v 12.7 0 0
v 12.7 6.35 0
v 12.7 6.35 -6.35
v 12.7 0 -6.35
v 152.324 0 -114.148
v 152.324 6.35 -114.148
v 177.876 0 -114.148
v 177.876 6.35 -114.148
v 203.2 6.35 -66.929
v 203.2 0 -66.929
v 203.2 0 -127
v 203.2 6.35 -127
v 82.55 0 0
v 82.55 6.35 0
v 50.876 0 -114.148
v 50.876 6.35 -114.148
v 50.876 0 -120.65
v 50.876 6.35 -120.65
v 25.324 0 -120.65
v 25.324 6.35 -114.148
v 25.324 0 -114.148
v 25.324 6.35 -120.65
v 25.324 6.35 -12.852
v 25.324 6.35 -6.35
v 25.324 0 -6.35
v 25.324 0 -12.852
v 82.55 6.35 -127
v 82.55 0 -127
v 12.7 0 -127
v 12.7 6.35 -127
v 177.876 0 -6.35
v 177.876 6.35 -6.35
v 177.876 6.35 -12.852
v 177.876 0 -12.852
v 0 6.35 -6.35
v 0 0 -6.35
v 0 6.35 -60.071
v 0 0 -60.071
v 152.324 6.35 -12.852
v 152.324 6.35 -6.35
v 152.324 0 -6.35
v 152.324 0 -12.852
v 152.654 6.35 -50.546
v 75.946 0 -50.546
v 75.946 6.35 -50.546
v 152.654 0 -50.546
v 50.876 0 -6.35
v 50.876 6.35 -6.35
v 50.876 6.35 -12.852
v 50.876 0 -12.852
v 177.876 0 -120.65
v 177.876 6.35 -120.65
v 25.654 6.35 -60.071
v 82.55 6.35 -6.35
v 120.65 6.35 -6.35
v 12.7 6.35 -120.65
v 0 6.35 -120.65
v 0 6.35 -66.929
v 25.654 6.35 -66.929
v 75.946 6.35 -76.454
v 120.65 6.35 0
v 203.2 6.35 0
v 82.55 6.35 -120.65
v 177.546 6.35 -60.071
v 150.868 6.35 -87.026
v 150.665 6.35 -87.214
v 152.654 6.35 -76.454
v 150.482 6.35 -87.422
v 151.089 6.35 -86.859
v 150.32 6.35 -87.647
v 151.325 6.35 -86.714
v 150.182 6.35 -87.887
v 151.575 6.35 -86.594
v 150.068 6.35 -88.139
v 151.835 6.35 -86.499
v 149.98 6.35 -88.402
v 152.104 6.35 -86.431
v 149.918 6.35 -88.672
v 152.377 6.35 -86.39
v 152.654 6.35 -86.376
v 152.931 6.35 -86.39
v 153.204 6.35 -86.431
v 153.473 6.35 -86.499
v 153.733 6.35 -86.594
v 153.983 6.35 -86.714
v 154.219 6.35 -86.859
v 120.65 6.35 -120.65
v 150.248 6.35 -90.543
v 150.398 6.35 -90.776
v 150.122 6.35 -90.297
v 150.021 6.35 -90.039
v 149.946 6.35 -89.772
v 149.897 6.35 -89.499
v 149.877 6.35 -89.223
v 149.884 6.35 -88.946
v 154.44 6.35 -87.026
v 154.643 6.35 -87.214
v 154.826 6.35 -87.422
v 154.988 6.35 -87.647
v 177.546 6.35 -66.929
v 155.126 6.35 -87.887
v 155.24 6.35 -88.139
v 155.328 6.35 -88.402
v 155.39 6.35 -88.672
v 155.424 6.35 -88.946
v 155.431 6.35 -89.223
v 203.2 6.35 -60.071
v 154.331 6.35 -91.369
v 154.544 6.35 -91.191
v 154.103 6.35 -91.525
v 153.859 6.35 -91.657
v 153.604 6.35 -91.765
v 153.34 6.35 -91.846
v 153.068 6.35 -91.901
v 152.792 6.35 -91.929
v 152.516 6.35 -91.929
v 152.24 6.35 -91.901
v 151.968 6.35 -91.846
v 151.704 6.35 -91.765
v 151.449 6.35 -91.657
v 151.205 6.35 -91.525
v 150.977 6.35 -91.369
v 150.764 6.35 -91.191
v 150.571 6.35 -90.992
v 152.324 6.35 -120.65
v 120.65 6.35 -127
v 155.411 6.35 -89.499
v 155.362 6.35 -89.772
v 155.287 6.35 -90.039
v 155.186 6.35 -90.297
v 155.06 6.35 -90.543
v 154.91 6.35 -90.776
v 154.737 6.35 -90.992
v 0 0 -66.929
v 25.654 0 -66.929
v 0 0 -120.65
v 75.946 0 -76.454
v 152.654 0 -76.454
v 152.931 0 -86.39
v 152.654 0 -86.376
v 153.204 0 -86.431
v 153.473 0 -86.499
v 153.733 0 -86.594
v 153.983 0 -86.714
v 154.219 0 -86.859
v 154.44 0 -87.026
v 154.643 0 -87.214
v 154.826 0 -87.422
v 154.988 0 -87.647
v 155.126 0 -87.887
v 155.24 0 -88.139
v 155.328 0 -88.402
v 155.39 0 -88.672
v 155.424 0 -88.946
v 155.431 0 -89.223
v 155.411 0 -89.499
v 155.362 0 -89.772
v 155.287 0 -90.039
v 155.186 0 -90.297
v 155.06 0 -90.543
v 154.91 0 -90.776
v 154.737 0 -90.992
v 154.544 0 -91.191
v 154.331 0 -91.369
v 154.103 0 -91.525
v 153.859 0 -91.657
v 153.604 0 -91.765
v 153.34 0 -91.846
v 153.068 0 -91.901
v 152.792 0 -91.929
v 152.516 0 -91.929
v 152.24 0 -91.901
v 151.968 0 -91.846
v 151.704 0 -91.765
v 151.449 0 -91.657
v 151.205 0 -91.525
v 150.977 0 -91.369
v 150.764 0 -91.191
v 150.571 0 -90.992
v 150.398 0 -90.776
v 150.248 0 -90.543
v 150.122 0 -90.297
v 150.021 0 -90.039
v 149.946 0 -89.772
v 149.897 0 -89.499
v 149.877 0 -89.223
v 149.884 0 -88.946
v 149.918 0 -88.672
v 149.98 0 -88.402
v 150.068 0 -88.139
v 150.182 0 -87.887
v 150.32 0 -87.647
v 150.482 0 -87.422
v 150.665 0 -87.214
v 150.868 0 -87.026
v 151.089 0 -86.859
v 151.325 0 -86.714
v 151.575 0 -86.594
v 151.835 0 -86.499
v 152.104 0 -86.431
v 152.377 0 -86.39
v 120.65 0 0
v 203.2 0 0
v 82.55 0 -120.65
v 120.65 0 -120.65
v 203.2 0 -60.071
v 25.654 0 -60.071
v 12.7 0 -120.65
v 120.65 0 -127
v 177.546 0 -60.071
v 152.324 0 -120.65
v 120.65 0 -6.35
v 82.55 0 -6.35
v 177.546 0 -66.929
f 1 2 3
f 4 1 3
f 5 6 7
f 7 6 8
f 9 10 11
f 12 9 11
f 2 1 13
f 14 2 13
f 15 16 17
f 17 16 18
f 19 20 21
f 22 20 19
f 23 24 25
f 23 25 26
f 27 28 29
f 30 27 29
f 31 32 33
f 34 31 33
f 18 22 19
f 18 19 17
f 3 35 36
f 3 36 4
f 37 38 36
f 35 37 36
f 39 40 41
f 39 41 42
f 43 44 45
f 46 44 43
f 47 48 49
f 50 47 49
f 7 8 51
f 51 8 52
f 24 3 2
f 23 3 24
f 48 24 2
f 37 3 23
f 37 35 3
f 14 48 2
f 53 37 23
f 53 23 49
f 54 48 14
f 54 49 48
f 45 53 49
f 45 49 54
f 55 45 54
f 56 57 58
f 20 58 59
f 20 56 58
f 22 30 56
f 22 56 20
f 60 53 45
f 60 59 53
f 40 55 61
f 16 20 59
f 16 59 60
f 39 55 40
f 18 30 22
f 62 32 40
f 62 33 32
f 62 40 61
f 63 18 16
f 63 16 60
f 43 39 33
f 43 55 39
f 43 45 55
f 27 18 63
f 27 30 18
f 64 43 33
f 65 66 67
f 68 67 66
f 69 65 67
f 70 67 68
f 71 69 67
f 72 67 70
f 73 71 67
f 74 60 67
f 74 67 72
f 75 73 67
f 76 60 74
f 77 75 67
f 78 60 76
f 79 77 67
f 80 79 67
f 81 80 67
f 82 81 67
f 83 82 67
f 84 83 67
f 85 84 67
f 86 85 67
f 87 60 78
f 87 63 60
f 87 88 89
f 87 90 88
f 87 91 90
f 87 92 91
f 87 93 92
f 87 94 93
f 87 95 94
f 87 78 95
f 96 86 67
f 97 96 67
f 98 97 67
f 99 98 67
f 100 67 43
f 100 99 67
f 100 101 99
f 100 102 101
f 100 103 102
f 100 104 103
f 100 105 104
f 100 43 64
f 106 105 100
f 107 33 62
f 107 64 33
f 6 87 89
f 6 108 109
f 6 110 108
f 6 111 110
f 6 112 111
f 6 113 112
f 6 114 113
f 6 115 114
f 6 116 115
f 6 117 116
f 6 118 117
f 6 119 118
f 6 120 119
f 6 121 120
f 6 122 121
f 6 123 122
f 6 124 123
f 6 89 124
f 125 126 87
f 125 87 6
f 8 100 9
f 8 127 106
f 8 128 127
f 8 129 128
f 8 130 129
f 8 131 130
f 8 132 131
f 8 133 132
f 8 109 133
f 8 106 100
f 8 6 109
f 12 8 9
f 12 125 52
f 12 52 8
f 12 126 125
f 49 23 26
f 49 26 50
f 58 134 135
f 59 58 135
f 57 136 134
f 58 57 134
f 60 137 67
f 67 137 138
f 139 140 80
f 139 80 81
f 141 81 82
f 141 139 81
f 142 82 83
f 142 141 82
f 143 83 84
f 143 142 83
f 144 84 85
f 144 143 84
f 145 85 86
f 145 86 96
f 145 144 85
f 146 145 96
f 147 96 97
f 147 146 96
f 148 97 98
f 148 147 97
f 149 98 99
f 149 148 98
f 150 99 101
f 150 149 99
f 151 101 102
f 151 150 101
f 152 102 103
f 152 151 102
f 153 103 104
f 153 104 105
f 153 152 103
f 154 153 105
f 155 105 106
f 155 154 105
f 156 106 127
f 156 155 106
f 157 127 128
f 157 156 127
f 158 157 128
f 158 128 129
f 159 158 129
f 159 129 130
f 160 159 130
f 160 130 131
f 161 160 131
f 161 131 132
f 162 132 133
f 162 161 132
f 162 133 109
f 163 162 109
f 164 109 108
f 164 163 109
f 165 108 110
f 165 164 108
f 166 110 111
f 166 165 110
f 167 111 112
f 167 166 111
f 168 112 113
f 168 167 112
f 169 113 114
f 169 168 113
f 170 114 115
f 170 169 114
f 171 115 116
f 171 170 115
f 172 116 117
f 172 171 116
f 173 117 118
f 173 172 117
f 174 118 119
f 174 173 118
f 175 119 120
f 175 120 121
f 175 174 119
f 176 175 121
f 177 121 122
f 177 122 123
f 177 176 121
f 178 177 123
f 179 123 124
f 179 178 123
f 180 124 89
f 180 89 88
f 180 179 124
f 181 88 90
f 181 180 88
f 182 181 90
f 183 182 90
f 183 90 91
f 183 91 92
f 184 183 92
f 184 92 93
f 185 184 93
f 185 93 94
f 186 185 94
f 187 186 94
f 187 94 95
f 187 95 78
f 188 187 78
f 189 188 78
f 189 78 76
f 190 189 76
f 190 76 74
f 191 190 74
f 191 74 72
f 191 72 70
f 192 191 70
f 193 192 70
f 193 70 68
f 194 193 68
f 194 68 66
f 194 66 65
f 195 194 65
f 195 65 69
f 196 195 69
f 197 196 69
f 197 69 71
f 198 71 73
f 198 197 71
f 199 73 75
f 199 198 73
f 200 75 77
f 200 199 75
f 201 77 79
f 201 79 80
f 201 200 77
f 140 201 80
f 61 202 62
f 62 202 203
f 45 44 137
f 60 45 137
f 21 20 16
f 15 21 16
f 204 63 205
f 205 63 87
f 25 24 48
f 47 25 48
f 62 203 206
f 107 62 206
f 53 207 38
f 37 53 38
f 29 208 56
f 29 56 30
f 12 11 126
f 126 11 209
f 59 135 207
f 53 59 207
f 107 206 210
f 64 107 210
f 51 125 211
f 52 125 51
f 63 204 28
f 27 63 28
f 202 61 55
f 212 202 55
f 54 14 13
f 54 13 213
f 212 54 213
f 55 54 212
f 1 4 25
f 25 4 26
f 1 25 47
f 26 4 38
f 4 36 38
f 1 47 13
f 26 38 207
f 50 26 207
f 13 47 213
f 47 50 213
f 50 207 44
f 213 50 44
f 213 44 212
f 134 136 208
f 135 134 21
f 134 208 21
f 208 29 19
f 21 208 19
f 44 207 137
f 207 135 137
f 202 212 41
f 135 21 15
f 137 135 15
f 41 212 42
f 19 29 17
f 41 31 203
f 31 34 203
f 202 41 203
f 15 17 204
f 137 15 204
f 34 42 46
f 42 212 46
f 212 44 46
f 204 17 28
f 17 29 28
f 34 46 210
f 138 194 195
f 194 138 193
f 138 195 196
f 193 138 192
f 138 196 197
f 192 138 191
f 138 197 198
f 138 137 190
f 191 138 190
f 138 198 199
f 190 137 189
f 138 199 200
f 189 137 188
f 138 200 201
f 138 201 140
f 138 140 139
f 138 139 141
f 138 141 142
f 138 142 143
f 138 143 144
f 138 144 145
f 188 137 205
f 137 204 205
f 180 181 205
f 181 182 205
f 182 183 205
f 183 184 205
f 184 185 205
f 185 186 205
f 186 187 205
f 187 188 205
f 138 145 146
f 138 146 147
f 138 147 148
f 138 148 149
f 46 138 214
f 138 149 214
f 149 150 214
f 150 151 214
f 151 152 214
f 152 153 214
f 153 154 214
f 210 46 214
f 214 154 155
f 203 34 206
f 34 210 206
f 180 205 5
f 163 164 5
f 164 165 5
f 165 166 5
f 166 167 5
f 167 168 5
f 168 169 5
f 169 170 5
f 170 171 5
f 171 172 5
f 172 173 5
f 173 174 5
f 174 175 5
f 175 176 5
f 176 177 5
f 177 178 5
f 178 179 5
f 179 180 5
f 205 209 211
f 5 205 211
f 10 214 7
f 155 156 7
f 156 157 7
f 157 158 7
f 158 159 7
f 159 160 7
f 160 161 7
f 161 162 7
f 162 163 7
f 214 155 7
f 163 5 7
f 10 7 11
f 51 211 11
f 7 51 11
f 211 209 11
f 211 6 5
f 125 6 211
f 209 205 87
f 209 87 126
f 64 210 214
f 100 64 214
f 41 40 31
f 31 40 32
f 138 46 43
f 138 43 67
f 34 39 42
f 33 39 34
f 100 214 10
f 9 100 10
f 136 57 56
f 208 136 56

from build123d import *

# Parameters (mm, degrees)
SKETCH1_R           = 2.778125
SKETCH1_W           = 76.708
SKETCH1_H           = 25.908
BOSS_EXTRUDE1_DEPTH = 6.35
SKETCH4_W           = 12.7
SKETCH4_H           = 6.35
SKETCH4_W_2         = 25.5524
SKETCH4_H_2         = 6.5024
SKETCH4_W_3         = 38.1
CUT_EXTRUDE1_DEPTH  = 240.70724332


with BuildPart() as part:
    # Sketch1 → Boss-Extrude1 (new body)
    with BuildSketch(Plane(origin=(0, 0, 0), x_dir=(1, 0, 0), z_dir=(0, 1, 0))):
        Polygon((0, 0), (203.2, 0), (203.2, 60.071), (177.546, 60.071), (177.546, 66.929), (203.2, 66.929), (203.2, 127), (0, 127), (0, 66.929), (25.654, 66.929), (25.654, 60.071), (0, 60.071), align=None)
        with Locations(Location((152.654, 89.154, 0), (0, 0, 270))):
            Circle(SKETCH1_R, mode=Mode.SUBTRACT)
        with Locations((114.3, 63.5)):
            Rectangle(SKETCH1_W, SKETCH1_H, mode=Mode.SUBTRACT)
    extrude(amount=BOSS_EXTRUDE1_DEPTH)

    # Sketch4 → Cut-Extrude1 (cut, through all)
    with BuildSketch(Plane(origin=(0, 6.35, 0), x_dir=(1, 0, 0), z_dir=(0, 1, 0))):
        with Locations((6.35, 123.825)):
            Rectangle(SKETCH4_W, SKETCH4_H)
        with Locations((38.1, 117.3988)):
            Rectangle(SKETCH4_W_2, SKETCH4_H_2)
        with Locations((101.6, 123.825)):
            Rectangle(SKETCH4_W_3, SKETCH4_H)
        with Locations((165.1, 117.3988)):
            Rectangle(SKETCH4_W_2, SKETCH4_H_2)
        with Locations((165.1, 9.6012)):
            Rectangle(SKETCH4_W_2, SKETCH4_H_2)
        with Locations((101.6, 3.175)):
            Rectangle(SKETCH4_W_3, SKETCH4_H)
        with Locations((38.1, 9.6012)):
            Rectangle(SKETCH4_W_2, SKETCH4_H_2)
        with Locations((6.35, 3.175)):
            Rectangle(SKETCH4_W, SKETCH4_H)
    extrude(amount=-CUT_EXTRUDE1_DEPTH, mode=Mode.SUBTRACT)


solid = part.part
